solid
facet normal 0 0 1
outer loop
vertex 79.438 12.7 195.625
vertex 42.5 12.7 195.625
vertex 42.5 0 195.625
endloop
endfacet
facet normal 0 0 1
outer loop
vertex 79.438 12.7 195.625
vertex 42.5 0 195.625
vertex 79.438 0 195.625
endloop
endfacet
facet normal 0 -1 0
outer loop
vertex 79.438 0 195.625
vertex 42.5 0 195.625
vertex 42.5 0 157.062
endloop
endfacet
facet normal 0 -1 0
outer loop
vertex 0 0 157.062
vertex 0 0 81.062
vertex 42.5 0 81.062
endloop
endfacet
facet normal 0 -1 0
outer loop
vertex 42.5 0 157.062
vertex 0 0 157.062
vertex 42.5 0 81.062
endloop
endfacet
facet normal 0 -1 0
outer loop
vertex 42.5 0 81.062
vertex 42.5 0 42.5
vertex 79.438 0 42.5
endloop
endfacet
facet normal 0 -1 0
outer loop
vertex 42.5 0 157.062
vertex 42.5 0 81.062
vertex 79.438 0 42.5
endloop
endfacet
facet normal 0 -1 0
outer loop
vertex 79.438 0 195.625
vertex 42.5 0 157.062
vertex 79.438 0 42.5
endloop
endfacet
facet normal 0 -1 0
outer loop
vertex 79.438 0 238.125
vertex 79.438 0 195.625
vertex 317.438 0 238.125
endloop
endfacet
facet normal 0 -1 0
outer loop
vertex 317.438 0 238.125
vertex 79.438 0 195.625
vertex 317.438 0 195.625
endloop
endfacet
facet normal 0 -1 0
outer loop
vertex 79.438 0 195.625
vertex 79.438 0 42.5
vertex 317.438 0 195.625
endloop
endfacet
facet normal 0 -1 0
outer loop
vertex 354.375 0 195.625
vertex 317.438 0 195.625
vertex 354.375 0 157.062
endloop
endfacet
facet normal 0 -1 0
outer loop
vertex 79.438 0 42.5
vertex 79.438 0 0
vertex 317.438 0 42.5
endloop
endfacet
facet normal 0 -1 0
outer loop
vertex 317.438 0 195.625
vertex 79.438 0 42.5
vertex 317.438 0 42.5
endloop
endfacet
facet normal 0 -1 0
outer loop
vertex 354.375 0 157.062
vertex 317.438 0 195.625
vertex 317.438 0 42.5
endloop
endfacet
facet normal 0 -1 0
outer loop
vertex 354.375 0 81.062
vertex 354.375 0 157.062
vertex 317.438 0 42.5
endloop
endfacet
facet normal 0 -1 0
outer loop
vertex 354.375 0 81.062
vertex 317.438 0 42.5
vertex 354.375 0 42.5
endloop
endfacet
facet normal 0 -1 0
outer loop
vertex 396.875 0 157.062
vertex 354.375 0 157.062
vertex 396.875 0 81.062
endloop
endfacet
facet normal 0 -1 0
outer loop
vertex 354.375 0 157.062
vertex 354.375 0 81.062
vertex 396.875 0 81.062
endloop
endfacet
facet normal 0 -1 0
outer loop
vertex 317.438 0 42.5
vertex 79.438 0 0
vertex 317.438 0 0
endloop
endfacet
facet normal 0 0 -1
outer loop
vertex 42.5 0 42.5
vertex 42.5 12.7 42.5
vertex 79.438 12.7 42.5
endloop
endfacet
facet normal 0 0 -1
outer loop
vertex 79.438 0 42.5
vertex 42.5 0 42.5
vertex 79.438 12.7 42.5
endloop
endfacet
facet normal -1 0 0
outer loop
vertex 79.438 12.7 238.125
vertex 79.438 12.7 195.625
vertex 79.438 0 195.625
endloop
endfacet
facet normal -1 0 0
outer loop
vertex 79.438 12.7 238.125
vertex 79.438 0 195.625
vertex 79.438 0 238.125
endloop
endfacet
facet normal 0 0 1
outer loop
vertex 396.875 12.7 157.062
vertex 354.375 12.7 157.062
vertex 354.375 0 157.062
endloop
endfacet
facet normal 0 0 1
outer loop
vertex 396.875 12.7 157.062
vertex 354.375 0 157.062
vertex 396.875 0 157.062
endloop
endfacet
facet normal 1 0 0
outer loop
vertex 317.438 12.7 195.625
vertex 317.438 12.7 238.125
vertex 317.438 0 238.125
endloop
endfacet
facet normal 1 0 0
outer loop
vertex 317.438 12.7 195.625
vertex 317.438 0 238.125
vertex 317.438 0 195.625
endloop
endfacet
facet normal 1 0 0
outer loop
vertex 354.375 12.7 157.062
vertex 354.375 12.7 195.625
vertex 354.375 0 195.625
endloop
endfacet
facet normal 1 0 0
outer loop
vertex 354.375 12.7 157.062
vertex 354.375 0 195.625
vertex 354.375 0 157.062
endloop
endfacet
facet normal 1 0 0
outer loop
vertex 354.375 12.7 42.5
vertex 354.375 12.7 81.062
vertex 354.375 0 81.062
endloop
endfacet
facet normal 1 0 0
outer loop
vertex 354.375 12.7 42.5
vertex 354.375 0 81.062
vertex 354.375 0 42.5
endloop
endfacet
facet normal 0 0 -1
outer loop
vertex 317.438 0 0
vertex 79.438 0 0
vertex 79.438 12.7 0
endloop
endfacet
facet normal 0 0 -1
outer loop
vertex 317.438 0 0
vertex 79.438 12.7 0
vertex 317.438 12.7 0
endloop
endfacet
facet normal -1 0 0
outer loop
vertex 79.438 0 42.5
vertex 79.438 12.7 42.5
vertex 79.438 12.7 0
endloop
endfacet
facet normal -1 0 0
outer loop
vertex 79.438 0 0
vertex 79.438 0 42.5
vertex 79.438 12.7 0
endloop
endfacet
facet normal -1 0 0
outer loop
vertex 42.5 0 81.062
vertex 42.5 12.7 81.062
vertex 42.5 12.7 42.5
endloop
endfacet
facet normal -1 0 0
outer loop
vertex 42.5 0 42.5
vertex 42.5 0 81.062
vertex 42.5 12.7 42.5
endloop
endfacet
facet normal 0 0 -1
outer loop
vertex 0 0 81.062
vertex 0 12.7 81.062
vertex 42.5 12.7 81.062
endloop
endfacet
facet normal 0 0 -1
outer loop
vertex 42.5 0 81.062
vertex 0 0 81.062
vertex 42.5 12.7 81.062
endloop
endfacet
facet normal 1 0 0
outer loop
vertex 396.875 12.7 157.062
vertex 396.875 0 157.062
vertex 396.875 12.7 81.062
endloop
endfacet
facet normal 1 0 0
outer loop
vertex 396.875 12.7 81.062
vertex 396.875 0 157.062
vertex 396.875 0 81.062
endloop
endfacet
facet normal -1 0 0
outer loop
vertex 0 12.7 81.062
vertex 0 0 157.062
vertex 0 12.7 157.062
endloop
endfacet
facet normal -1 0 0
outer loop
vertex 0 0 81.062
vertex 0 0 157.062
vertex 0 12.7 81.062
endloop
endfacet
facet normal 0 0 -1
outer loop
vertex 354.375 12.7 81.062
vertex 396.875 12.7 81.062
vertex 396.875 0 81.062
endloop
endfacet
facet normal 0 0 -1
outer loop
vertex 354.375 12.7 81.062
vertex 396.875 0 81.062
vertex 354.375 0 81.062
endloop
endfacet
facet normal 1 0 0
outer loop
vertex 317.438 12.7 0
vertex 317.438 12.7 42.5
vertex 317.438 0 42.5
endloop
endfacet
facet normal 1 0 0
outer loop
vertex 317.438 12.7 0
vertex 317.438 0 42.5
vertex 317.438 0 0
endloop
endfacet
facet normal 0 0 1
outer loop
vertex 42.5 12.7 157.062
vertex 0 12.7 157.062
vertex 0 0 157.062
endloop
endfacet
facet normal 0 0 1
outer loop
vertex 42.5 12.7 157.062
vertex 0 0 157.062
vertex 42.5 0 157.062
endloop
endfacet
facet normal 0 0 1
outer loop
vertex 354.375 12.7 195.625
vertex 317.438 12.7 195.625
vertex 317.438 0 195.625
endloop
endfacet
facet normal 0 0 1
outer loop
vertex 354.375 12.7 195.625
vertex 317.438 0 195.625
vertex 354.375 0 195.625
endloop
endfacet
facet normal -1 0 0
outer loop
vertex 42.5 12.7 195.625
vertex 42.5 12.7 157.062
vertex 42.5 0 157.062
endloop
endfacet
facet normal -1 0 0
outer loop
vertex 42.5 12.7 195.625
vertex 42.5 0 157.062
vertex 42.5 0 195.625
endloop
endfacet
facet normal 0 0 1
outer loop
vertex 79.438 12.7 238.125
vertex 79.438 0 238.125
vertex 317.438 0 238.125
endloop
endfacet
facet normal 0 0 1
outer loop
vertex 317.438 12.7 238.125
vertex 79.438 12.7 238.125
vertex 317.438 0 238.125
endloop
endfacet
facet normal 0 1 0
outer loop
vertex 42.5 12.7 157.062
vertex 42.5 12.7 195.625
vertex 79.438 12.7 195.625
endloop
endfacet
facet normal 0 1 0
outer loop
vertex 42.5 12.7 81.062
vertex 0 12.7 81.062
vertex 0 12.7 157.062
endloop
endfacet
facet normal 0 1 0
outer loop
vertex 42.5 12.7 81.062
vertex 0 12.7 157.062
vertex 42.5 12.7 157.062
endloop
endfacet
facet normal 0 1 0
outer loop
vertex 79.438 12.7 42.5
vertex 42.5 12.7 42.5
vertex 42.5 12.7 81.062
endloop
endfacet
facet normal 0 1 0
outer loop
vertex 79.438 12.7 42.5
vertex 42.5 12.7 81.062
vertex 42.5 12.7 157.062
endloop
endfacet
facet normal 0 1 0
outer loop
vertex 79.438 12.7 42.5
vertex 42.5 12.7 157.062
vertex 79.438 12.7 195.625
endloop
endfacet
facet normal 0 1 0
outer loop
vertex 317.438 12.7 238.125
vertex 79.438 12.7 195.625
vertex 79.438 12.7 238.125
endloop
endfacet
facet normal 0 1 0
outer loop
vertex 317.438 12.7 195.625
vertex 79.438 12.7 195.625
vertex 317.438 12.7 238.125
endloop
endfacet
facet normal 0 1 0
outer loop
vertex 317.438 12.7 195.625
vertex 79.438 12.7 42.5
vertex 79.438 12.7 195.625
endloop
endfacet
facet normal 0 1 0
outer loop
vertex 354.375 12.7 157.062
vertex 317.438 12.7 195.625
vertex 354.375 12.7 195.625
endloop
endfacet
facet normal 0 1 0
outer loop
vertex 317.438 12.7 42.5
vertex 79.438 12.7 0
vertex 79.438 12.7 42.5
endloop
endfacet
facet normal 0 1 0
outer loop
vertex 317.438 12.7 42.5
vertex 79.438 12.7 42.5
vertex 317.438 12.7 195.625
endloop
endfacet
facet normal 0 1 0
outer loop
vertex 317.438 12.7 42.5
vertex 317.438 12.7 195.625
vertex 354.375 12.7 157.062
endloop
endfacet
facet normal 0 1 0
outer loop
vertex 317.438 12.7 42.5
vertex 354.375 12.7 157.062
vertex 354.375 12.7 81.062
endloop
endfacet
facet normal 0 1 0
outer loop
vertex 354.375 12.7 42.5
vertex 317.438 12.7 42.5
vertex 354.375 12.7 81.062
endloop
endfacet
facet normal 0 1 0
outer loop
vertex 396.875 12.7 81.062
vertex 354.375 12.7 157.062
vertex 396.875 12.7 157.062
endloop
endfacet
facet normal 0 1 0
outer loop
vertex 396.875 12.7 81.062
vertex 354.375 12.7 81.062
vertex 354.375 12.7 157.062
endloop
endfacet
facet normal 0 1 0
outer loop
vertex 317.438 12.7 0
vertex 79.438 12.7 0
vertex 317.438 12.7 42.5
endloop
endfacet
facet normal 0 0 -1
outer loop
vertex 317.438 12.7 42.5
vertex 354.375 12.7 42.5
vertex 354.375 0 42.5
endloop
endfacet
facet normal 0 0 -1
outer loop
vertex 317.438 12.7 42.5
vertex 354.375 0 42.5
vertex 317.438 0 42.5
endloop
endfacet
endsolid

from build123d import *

# Parameters (mm, degrees)
SKETCH1_W           = 396.875
SKETCH1_H           = 238.125
BOSS_EXTRUDE1_DEPTH = 12.7
CUT_EXTRUDE1_DEPTH  = 13.7


with BuildPart() as part:
    # Sketch1 → Boss-Extrude1 (new body)
    with BuildSketch(Plane(origin=(0, 0, 0), x_dir=(1, 0, 0), z_dir=(0, 1, 0))):
        with Locations((198.4375, -119.0625)):
            Rectangle(SKETCH1_W, SKETCH1_H)
    extrude(amount=BOSS_EXTRUDE1_DEPTH)

    # Sketch2 → Cut-Extrude1 (cut, through all)
    with BuildSketch(Plane(origin=(0, 12.7, 0), x_dir=(1, 0, 0), z_dir=(0, 1, 0))):
        Polygon((79.4375, -238.125), (0, -238.125), (0, -195.625), (0, -157.0625), (42.5, -157.0625), (42.5, -195.625), (79.4375, -195.625), align=None)
        Polygon((79.4375, 0), (0, 0), (0, -42.5), (0, -81.0625), (42.5, -81.0625), (42.5, -42.5), (79.4375, -42.5), align=None)
        Polygon((317.4375, 0), (396.875, 0), (396.875, -42.5), (396.875, -81.0625), (354.375, -81.0625), (354.375, -42.5), (317.4375, -42.5), align=None)
        Polygon((317.4375, -238.125), (317.4375, -195.625), (354.375, -195.625), (354.375, -157.0625), (396.875, -157.0625), (396.875, -195.625), (396.875, -238.125), align=None)
    extrude(amount=-CUT_EXTRUDE1_DEPTH, mode=Mode.SUBTRACT)


solid = part.part
